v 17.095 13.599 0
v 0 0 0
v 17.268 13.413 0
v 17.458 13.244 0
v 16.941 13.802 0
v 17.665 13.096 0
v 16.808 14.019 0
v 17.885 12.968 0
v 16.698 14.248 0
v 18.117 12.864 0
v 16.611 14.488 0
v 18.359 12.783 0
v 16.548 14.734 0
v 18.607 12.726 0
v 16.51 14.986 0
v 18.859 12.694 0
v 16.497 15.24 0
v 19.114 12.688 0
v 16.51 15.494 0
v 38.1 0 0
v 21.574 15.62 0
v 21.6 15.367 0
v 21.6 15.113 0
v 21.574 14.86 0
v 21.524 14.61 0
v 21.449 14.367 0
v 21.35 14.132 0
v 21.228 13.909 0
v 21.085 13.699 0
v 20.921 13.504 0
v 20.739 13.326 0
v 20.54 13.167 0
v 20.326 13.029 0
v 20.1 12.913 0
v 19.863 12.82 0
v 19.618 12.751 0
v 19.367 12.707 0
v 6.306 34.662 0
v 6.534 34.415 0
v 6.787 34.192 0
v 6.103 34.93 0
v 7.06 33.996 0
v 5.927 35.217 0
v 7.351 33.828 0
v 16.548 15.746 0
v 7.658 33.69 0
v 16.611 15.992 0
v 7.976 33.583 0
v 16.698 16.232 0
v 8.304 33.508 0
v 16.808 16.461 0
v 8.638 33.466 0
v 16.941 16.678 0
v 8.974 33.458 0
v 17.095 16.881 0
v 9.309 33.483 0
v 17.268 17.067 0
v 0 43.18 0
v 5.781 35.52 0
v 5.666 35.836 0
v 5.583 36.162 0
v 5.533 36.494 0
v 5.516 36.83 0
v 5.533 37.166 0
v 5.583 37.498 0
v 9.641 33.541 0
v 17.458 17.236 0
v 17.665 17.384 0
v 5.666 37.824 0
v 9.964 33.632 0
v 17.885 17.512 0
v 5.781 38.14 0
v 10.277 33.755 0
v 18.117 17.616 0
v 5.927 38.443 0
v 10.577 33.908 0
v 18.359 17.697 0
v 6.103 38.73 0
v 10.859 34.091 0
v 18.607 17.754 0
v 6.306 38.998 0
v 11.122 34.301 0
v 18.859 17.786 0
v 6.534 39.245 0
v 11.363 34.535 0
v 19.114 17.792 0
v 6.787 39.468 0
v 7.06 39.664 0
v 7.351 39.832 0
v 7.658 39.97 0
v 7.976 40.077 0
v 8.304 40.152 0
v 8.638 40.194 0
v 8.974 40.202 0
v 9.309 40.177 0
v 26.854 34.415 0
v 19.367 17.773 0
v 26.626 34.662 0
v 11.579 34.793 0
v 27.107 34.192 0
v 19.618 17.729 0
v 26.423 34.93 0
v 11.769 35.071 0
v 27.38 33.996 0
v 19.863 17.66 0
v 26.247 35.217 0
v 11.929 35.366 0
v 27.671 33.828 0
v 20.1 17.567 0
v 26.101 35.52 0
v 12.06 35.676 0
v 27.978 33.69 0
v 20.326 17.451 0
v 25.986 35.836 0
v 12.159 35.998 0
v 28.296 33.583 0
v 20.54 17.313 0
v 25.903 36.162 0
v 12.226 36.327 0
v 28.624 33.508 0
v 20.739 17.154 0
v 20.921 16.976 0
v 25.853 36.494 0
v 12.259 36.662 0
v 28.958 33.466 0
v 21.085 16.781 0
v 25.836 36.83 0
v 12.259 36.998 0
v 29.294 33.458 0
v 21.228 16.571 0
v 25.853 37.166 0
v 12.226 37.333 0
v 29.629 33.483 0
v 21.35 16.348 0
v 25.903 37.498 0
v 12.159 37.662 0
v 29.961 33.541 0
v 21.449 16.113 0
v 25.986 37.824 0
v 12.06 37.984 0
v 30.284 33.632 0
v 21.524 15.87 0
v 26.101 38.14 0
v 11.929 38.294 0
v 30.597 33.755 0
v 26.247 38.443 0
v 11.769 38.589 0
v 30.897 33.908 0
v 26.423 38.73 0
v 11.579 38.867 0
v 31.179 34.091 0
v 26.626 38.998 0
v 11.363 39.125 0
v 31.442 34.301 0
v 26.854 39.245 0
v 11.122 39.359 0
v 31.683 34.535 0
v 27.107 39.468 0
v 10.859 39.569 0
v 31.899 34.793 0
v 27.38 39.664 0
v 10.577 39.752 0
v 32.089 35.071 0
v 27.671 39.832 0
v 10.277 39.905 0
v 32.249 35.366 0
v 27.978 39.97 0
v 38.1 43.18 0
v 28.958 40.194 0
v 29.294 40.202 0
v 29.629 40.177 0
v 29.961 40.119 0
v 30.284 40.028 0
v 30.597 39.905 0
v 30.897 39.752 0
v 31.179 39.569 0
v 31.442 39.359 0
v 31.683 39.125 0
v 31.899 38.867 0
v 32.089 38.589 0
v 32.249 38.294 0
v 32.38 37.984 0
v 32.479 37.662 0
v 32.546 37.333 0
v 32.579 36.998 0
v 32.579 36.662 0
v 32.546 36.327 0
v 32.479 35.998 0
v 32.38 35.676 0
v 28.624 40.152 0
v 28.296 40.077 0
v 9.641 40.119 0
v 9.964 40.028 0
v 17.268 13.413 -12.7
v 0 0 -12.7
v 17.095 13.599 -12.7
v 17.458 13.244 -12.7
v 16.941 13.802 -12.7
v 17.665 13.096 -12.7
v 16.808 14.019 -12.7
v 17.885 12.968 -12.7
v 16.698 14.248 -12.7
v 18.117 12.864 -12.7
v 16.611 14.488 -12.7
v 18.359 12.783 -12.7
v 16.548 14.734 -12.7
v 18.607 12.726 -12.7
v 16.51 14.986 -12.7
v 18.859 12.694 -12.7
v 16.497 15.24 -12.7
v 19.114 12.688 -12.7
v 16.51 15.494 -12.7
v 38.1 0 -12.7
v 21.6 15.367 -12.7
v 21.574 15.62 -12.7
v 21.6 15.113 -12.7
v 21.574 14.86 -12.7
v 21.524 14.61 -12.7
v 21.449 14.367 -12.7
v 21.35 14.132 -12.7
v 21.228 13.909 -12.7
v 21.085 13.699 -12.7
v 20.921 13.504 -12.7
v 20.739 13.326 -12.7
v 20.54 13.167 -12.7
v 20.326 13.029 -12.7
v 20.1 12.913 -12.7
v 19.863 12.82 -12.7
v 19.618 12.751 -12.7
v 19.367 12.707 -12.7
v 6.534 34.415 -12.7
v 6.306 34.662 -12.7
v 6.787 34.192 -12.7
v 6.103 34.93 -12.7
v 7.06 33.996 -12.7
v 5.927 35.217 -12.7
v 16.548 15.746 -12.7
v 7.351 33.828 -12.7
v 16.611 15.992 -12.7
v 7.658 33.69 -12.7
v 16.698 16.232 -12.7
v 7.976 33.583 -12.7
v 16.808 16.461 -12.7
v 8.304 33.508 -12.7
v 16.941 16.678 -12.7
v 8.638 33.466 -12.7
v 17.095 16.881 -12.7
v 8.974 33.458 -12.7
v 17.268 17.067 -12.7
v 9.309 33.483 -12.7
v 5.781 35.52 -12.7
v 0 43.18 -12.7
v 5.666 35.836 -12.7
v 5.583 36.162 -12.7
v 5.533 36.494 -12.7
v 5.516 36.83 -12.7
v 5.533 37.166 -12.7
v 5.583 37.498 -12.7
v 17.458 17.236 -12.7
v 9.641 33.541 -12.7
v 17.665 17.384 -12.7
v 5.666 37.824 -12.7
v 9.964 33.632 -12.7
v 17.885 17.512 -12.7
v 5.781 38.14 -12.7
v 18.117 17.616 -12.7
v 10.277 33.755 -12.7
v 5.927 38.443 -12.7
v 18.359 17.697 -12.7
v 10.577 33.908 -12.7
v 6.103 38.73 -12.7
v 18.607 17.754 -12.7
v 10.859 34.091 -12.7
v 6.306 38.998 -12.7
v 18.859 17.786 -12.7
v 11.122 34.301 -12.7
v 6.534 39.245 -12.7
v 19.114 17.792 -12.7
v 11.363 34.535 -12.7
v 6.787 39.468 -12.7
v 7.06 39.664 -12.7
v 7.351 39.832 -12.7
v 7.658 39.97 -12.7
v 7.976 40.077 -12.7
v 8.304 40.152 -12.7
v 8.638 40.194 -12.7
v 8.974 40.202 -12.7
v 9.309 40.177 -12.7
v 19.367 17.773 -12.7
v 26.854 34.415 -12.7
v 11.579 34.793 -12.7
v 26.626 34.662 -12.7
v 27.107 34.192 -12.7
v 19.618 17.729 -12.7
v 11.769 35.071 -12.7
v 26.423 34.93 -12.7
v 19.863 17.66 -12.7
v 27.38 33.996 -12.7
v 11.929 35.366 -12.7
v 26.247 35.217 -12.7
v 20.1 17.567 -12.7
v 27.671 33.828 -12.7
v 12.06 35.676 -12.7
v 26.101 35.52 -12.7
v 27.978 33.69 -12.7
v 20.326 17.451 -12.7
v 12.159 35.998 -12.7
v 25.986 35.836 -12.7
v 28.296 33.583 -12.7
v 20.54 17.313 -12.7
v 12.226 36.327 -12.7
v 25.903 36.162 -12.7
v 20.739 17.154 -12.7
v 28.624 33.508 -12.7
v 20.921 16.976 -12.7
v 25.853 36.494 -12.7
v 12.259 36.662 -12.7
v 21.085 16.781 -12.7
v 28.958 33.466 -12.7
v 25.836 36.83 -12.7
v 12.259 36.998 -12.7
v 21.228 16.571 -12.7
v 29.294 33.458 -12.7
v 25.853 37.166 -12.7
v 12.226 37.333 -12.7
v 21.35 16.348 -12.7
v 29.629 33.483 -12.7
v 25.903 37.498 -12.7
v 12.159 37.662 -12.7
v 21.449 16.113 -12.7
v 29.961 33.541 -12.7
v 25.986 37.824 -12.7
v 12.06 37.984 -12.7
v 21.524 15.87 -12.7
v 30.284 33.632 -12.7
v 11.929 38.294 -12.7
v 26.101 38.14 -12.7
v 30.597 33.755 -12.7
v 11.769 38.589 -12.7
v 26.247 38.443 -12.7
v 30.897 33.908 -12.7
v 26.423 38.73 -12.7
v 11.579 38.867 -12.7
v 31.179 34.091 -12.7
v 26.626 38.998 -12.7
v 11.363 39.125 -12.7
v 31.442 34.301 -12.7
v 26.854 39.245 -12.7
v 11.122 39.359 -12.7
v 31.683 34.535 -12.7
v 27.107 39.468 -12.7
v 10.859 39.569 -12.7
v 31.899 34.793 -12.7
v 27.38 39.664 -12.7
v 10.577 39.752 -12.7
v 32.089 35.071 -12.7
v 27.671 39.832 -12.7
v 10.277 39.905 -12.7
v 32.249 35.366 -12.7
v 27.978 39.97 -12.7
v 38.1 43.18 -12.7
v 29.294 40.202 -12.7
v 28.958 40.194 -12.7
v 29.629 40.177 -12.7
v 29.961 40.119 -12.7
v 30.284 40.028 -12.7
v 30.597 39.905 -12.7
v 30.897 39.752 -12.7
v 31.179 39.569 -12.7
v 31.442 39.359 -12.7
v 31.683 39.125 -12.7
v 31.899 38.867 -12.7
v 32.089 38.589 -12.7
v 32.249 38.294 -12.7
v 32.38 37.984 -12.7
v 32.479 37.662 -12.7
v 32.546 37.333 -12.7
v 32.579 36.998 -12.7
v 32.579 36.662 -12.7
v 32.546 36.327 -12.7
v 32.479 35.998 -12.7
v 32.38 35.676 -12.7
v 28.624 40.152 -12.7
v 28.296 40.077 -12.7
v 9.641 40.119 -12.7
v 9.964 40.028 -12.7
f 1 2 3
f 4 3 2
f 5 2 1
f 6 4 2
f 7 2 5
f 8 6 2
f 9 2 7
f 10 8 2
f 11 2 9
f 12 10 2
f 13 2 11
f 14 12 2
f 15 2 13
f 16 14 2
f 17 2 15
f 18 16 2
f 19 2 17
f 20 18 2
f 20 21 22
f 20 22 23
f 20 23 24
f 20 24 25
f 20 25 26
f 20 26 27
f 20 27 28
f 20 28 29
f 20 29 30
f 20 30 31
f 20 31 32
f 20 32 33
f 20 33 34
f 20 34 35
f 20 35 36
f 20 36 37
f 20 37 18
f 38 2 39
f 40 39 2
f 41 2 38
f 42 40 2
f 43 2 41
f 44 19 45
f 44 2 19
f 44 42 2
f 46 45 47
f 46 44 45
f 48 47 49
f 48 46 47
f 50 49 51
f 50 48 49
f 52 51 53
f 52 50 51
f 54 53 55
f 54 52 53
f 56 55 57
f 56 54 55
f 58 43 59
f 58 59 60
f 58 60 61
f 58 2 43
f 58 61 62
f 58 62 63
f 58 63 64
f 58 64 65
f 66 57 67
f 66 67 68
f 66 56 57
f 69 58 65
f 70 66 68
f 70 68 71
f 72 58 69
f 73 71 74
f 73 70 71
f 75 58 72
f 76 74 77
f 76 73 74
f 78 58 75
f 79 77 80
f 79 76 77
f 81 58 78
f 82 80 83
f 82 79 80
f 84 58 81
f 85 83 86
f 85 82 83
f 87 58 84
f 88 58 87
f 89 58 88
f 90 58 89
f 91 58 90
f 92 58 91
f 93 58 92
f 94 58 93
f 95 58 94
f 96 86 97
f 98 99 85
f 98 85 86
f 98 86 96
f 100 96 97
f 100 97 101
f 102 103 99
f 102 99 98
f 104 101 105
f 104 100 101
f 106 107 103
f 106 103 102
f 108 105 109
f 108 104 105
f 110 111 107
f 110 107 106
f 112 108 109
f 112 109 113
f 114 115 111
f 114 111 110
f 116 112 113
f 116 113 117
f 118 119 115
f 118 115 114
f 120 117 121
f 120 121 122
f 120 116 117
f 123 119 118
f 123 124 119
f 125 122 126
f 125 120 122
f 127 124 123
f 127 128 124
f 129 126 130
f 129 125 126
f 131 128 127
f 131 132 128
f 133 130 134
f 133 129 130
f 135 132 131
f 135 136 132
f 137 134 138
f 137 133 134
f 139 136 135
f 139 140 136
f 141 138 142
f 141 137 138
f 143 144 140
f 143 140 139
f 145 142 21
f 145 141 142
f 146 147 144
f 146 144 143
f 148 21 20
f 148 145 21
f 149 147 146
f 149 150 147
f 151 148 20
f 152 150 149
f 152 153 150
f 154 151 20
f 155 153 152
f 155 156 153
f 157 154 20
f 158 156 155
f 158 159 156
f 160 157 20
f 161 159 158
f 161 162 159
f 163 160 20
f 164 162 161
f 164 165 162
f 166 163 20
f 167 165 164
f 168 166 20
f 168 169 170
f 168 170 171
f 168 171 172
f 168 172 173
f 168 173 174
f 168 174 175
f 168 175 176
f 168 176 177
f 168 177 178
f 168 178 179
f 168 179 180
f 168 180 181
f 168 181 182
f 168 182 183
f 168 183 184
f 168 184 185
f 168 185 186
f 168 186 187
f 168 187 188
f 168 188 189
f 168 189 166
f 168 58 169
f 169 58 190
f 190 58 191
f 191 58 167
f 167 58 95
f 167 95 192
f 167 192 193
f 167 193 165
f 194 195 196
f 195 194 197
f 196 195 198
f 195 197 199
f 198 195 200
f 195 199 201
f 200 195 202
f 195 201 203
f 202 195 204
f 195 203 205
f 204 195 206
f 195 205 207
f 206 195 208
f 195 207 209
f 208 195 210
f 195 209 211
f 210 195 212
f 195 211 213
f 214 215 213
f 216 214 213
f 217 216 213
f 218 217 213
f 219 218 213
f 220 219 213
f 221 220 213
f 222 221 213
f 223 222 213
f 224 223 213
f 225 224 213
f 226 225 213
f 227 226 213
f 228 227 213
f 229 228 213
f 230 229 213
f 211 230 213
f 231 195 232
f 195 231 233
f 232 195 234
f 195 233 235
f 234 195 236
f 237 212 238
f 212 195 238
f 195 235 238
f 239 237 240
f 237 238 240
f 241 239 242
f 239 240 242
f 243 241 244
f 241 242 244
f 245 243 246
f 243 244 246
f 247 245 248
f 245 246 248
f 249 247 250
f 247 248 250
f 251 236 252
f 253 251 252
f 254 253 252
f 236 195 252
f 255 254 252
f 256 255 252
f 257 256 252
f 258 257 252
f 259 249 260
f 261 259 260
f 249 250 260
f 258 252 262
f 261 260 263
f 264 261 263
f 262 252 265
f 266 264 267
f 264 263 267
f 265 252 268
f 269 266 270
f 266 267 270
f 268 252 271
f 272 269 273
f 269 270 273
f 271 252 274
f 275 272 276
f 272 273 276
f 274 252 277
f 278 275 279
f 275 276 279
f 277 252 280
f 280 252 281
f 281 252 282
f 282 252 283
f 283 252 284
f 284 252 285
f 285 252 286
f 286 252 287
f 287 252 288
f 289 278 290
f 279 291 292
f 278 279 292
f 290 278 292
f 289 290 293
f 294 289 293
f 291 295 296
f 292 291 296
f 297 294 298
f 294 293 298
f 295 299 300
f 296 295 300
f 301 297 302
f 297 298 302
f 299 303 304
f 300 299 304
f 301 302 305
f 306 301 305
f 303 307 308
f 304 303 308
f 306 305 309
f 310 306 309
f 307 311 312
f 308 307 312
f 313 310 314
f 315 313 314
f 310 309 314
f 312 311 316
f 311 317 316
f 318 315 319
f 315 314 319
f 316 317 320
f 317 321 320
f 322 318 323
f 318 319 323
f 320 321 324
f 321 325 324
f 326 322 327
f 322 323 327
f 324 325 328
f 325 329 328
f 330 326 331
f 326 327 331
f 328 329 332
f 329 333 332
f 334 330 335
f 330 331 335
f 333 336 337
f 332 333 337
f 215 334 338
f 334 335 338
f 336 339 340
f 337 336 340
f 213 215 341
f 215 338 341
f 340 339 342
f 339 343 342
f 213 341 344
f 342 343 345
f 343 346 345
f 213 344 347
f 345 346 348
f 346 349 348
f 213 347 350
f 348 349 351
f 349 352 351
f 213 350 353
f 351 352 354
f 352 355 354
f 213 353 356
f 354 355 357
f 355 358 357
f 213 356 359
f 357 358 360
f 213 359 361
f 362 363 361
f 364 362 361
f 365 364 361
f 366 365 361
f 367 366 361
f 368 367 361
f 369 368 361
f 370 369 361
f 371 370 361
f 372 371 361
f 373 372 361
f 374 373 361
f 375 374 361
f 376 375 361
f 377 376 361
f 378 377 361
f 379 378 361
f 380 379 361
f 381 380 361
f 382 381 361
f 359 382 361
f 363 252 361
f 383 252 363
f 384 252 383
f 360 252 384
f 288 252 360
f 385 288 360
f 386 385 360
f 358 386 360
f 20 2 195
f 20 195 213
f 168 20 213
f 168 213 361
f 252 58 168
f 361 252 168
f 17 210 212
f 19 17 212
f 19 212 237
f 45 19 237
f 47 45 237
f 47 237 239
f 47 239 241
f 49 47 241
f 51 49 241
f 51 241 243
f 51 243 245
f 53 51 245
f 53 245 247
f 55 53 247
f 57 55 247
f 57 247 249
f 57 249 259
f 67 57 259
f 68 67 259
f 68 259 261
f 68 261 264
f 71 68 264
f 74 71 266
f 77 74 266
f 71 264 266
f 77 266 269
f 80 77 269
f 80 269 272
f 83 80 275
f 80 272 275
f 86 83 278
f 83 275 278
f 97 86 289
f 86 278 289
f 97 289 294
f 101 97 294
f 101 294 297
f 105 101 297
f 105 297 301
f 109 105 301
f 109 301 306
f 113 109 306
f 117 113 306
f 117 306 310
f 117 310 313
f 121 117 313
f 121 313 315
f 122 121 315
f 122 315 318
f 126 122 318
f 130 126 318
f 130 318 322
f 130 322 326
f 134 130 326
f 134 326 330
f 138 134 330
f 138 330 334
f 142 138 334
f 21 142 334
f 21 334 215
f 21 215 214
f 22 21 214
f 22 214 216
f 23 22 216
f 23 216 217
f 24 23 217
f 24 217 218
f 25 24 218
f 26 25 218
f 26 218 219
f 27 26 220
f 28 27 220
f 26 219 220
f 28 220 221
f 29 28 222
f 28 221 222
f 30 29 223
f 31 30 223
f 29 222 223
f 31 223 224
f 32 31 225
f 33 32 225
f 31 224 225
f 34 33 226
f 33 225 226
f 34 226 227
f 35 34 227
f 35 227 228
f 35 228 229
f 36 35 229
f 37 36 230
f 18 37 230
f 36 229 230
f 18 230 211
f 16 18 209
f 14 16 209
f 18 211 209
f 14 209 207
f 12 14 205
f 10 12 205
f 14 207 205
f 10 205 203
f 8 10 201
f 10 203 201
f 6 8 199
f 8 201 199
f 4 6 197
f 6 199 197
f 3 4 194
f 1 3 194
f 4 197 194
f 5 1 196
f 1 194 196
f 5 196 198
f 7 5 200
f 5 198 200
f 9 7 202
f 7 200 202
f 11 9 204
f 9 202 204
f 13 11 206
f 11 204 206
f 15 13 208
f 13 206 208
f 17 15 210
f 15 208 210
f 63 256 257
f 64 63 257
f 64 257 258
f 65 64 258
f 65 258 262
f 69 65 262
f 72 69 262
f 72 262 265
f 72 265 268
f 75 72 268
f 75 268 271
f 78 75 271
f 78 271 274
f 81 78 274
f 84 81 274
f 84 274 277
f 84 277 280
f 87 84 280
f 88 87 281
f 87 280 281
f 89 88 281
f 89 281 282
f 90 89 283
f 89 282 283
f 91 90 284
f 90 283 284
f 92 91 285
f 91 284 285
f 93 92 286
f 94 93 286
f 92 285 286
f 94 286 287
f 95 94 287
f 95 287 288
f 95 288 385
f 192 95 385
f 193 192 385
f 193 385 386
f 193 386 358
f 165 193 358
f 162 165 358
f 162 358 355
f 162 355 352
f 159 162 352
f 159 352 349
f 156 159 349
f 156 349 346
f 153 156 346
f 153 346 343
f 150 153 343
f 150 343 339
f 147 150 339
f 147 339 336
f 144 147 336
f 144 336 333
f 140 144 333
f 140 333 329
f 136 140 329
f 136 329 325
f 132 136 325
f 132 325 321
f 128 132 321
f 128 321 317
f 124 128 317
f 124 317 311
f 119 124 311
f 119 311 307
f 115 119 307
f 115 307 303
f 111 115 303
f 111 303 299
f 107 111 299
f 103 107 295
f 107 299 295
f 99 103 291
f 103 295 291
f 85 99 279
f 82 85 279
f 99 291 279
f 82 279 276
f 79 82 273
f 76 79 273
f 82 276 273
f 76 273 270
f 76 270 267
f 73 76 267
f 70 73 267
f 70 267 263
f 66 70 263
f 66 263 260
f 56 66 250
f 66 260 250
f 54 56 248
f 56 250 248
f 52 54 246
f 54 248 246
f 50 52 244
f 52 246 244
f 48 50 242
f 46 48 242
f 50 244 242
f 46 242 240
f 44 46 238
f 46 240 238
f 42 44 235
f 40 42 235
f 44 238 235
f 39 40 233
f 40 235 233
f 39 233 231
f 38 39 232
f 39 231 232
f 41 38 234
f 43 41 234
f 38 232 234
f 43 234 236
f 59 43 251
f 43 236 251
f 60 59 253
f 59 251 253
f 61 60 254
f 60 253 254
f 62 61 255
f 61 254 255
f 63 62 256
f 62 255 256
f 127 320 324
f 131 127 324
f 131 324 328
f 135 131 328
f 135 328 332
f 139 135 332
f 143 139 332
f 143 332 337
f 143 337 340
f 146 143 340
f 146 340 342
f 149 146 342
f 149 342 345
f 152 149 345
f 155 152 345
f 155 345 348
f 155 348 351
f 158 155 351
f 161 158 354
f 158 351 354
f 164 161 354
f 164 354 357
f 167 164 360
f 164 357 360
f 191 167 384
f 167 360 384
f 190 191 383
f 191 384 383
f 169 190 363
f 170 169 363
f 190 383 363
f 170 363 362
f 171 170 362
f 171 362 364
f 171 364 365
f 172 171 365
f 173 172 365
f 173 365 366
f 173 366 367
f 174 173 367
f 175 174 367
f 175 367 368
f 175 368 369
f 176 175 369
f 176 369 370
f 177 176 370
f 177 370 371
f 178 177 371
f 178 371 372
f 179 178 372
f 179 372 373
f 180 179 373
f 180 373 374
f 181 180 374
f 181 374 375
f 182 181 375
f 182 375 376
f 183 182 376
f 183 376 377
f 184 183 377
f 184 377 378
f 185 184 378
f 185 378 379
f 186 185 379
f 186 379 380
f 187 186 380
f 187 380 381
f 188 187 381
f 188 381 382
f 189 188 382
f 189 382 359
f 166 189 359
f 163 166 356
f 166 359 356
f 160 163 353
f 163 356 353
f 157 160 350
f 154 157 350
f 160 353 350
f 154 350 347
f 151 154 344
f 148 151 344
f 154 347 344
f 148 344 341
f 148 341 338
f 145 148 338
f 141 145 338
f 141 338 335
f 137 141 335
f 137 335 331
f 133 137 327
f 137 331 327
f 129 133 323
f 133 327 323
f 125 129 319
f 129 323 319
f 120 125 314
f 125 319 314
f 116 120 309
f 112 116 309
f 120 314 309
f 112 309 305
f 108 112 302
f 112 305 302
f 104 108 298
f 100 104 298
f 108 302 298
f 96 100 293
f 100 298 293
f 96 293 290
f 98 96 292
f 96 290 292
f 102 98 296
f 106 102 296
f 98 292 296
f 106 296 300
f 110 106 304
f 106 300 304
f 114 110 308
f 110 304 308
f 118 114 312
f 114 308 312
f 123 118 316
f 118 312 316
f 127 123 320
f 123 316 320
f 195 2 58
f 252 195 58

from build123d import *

# Parameters (mm, degrees)
SKETCH1_W                        = 38.1
SKETCH1_H                        = 43.18
BOSS_EXTRUDE1_DEPTH              = 12.7
F_17_64_0_26563_DIAMETER_HOLE1_D = 6.747002
F_1_4_20_TAPPED_HOLE1_D          = 5.1054
F_1_4_20_TAPPED_HOLE1_DEPTH      = 12.7


with BuildPart() as part:
    # Sketch1 → Boss-Extrude1 (new body)
    with BuildSketch(Plane.XY):
        with Locations((19.05, 21.59)):
            Rectangle(SKETCH1_W, SKETCH1_H)
    extrude(amount=-BOSS_EXTRUDE1_DEPTH)

    # 17/64 (0.26563) Diameter Hole1 (through all)
    with Locations(Plane(origin=(29.21, 36.83, 0), x_dir=(1, 0, 0), z_dir=(0, 0, 1))):
        with Locations((0, 0), (-20.32, 0)):
            Hole(F_17_64_0_26563_DIAMETER_HOLE1_D / 2)

    # 1/4-20 Tapped Hole1
    with Locations(Plane.XY):
        with Locations((19.05, 15.24)):
            Hole(F_1_4_20_TAPPED_HOLE1_D / 2, depth=F_1_4_20_TAPPED_HOLE1_DEPTH)


solid = part.part
